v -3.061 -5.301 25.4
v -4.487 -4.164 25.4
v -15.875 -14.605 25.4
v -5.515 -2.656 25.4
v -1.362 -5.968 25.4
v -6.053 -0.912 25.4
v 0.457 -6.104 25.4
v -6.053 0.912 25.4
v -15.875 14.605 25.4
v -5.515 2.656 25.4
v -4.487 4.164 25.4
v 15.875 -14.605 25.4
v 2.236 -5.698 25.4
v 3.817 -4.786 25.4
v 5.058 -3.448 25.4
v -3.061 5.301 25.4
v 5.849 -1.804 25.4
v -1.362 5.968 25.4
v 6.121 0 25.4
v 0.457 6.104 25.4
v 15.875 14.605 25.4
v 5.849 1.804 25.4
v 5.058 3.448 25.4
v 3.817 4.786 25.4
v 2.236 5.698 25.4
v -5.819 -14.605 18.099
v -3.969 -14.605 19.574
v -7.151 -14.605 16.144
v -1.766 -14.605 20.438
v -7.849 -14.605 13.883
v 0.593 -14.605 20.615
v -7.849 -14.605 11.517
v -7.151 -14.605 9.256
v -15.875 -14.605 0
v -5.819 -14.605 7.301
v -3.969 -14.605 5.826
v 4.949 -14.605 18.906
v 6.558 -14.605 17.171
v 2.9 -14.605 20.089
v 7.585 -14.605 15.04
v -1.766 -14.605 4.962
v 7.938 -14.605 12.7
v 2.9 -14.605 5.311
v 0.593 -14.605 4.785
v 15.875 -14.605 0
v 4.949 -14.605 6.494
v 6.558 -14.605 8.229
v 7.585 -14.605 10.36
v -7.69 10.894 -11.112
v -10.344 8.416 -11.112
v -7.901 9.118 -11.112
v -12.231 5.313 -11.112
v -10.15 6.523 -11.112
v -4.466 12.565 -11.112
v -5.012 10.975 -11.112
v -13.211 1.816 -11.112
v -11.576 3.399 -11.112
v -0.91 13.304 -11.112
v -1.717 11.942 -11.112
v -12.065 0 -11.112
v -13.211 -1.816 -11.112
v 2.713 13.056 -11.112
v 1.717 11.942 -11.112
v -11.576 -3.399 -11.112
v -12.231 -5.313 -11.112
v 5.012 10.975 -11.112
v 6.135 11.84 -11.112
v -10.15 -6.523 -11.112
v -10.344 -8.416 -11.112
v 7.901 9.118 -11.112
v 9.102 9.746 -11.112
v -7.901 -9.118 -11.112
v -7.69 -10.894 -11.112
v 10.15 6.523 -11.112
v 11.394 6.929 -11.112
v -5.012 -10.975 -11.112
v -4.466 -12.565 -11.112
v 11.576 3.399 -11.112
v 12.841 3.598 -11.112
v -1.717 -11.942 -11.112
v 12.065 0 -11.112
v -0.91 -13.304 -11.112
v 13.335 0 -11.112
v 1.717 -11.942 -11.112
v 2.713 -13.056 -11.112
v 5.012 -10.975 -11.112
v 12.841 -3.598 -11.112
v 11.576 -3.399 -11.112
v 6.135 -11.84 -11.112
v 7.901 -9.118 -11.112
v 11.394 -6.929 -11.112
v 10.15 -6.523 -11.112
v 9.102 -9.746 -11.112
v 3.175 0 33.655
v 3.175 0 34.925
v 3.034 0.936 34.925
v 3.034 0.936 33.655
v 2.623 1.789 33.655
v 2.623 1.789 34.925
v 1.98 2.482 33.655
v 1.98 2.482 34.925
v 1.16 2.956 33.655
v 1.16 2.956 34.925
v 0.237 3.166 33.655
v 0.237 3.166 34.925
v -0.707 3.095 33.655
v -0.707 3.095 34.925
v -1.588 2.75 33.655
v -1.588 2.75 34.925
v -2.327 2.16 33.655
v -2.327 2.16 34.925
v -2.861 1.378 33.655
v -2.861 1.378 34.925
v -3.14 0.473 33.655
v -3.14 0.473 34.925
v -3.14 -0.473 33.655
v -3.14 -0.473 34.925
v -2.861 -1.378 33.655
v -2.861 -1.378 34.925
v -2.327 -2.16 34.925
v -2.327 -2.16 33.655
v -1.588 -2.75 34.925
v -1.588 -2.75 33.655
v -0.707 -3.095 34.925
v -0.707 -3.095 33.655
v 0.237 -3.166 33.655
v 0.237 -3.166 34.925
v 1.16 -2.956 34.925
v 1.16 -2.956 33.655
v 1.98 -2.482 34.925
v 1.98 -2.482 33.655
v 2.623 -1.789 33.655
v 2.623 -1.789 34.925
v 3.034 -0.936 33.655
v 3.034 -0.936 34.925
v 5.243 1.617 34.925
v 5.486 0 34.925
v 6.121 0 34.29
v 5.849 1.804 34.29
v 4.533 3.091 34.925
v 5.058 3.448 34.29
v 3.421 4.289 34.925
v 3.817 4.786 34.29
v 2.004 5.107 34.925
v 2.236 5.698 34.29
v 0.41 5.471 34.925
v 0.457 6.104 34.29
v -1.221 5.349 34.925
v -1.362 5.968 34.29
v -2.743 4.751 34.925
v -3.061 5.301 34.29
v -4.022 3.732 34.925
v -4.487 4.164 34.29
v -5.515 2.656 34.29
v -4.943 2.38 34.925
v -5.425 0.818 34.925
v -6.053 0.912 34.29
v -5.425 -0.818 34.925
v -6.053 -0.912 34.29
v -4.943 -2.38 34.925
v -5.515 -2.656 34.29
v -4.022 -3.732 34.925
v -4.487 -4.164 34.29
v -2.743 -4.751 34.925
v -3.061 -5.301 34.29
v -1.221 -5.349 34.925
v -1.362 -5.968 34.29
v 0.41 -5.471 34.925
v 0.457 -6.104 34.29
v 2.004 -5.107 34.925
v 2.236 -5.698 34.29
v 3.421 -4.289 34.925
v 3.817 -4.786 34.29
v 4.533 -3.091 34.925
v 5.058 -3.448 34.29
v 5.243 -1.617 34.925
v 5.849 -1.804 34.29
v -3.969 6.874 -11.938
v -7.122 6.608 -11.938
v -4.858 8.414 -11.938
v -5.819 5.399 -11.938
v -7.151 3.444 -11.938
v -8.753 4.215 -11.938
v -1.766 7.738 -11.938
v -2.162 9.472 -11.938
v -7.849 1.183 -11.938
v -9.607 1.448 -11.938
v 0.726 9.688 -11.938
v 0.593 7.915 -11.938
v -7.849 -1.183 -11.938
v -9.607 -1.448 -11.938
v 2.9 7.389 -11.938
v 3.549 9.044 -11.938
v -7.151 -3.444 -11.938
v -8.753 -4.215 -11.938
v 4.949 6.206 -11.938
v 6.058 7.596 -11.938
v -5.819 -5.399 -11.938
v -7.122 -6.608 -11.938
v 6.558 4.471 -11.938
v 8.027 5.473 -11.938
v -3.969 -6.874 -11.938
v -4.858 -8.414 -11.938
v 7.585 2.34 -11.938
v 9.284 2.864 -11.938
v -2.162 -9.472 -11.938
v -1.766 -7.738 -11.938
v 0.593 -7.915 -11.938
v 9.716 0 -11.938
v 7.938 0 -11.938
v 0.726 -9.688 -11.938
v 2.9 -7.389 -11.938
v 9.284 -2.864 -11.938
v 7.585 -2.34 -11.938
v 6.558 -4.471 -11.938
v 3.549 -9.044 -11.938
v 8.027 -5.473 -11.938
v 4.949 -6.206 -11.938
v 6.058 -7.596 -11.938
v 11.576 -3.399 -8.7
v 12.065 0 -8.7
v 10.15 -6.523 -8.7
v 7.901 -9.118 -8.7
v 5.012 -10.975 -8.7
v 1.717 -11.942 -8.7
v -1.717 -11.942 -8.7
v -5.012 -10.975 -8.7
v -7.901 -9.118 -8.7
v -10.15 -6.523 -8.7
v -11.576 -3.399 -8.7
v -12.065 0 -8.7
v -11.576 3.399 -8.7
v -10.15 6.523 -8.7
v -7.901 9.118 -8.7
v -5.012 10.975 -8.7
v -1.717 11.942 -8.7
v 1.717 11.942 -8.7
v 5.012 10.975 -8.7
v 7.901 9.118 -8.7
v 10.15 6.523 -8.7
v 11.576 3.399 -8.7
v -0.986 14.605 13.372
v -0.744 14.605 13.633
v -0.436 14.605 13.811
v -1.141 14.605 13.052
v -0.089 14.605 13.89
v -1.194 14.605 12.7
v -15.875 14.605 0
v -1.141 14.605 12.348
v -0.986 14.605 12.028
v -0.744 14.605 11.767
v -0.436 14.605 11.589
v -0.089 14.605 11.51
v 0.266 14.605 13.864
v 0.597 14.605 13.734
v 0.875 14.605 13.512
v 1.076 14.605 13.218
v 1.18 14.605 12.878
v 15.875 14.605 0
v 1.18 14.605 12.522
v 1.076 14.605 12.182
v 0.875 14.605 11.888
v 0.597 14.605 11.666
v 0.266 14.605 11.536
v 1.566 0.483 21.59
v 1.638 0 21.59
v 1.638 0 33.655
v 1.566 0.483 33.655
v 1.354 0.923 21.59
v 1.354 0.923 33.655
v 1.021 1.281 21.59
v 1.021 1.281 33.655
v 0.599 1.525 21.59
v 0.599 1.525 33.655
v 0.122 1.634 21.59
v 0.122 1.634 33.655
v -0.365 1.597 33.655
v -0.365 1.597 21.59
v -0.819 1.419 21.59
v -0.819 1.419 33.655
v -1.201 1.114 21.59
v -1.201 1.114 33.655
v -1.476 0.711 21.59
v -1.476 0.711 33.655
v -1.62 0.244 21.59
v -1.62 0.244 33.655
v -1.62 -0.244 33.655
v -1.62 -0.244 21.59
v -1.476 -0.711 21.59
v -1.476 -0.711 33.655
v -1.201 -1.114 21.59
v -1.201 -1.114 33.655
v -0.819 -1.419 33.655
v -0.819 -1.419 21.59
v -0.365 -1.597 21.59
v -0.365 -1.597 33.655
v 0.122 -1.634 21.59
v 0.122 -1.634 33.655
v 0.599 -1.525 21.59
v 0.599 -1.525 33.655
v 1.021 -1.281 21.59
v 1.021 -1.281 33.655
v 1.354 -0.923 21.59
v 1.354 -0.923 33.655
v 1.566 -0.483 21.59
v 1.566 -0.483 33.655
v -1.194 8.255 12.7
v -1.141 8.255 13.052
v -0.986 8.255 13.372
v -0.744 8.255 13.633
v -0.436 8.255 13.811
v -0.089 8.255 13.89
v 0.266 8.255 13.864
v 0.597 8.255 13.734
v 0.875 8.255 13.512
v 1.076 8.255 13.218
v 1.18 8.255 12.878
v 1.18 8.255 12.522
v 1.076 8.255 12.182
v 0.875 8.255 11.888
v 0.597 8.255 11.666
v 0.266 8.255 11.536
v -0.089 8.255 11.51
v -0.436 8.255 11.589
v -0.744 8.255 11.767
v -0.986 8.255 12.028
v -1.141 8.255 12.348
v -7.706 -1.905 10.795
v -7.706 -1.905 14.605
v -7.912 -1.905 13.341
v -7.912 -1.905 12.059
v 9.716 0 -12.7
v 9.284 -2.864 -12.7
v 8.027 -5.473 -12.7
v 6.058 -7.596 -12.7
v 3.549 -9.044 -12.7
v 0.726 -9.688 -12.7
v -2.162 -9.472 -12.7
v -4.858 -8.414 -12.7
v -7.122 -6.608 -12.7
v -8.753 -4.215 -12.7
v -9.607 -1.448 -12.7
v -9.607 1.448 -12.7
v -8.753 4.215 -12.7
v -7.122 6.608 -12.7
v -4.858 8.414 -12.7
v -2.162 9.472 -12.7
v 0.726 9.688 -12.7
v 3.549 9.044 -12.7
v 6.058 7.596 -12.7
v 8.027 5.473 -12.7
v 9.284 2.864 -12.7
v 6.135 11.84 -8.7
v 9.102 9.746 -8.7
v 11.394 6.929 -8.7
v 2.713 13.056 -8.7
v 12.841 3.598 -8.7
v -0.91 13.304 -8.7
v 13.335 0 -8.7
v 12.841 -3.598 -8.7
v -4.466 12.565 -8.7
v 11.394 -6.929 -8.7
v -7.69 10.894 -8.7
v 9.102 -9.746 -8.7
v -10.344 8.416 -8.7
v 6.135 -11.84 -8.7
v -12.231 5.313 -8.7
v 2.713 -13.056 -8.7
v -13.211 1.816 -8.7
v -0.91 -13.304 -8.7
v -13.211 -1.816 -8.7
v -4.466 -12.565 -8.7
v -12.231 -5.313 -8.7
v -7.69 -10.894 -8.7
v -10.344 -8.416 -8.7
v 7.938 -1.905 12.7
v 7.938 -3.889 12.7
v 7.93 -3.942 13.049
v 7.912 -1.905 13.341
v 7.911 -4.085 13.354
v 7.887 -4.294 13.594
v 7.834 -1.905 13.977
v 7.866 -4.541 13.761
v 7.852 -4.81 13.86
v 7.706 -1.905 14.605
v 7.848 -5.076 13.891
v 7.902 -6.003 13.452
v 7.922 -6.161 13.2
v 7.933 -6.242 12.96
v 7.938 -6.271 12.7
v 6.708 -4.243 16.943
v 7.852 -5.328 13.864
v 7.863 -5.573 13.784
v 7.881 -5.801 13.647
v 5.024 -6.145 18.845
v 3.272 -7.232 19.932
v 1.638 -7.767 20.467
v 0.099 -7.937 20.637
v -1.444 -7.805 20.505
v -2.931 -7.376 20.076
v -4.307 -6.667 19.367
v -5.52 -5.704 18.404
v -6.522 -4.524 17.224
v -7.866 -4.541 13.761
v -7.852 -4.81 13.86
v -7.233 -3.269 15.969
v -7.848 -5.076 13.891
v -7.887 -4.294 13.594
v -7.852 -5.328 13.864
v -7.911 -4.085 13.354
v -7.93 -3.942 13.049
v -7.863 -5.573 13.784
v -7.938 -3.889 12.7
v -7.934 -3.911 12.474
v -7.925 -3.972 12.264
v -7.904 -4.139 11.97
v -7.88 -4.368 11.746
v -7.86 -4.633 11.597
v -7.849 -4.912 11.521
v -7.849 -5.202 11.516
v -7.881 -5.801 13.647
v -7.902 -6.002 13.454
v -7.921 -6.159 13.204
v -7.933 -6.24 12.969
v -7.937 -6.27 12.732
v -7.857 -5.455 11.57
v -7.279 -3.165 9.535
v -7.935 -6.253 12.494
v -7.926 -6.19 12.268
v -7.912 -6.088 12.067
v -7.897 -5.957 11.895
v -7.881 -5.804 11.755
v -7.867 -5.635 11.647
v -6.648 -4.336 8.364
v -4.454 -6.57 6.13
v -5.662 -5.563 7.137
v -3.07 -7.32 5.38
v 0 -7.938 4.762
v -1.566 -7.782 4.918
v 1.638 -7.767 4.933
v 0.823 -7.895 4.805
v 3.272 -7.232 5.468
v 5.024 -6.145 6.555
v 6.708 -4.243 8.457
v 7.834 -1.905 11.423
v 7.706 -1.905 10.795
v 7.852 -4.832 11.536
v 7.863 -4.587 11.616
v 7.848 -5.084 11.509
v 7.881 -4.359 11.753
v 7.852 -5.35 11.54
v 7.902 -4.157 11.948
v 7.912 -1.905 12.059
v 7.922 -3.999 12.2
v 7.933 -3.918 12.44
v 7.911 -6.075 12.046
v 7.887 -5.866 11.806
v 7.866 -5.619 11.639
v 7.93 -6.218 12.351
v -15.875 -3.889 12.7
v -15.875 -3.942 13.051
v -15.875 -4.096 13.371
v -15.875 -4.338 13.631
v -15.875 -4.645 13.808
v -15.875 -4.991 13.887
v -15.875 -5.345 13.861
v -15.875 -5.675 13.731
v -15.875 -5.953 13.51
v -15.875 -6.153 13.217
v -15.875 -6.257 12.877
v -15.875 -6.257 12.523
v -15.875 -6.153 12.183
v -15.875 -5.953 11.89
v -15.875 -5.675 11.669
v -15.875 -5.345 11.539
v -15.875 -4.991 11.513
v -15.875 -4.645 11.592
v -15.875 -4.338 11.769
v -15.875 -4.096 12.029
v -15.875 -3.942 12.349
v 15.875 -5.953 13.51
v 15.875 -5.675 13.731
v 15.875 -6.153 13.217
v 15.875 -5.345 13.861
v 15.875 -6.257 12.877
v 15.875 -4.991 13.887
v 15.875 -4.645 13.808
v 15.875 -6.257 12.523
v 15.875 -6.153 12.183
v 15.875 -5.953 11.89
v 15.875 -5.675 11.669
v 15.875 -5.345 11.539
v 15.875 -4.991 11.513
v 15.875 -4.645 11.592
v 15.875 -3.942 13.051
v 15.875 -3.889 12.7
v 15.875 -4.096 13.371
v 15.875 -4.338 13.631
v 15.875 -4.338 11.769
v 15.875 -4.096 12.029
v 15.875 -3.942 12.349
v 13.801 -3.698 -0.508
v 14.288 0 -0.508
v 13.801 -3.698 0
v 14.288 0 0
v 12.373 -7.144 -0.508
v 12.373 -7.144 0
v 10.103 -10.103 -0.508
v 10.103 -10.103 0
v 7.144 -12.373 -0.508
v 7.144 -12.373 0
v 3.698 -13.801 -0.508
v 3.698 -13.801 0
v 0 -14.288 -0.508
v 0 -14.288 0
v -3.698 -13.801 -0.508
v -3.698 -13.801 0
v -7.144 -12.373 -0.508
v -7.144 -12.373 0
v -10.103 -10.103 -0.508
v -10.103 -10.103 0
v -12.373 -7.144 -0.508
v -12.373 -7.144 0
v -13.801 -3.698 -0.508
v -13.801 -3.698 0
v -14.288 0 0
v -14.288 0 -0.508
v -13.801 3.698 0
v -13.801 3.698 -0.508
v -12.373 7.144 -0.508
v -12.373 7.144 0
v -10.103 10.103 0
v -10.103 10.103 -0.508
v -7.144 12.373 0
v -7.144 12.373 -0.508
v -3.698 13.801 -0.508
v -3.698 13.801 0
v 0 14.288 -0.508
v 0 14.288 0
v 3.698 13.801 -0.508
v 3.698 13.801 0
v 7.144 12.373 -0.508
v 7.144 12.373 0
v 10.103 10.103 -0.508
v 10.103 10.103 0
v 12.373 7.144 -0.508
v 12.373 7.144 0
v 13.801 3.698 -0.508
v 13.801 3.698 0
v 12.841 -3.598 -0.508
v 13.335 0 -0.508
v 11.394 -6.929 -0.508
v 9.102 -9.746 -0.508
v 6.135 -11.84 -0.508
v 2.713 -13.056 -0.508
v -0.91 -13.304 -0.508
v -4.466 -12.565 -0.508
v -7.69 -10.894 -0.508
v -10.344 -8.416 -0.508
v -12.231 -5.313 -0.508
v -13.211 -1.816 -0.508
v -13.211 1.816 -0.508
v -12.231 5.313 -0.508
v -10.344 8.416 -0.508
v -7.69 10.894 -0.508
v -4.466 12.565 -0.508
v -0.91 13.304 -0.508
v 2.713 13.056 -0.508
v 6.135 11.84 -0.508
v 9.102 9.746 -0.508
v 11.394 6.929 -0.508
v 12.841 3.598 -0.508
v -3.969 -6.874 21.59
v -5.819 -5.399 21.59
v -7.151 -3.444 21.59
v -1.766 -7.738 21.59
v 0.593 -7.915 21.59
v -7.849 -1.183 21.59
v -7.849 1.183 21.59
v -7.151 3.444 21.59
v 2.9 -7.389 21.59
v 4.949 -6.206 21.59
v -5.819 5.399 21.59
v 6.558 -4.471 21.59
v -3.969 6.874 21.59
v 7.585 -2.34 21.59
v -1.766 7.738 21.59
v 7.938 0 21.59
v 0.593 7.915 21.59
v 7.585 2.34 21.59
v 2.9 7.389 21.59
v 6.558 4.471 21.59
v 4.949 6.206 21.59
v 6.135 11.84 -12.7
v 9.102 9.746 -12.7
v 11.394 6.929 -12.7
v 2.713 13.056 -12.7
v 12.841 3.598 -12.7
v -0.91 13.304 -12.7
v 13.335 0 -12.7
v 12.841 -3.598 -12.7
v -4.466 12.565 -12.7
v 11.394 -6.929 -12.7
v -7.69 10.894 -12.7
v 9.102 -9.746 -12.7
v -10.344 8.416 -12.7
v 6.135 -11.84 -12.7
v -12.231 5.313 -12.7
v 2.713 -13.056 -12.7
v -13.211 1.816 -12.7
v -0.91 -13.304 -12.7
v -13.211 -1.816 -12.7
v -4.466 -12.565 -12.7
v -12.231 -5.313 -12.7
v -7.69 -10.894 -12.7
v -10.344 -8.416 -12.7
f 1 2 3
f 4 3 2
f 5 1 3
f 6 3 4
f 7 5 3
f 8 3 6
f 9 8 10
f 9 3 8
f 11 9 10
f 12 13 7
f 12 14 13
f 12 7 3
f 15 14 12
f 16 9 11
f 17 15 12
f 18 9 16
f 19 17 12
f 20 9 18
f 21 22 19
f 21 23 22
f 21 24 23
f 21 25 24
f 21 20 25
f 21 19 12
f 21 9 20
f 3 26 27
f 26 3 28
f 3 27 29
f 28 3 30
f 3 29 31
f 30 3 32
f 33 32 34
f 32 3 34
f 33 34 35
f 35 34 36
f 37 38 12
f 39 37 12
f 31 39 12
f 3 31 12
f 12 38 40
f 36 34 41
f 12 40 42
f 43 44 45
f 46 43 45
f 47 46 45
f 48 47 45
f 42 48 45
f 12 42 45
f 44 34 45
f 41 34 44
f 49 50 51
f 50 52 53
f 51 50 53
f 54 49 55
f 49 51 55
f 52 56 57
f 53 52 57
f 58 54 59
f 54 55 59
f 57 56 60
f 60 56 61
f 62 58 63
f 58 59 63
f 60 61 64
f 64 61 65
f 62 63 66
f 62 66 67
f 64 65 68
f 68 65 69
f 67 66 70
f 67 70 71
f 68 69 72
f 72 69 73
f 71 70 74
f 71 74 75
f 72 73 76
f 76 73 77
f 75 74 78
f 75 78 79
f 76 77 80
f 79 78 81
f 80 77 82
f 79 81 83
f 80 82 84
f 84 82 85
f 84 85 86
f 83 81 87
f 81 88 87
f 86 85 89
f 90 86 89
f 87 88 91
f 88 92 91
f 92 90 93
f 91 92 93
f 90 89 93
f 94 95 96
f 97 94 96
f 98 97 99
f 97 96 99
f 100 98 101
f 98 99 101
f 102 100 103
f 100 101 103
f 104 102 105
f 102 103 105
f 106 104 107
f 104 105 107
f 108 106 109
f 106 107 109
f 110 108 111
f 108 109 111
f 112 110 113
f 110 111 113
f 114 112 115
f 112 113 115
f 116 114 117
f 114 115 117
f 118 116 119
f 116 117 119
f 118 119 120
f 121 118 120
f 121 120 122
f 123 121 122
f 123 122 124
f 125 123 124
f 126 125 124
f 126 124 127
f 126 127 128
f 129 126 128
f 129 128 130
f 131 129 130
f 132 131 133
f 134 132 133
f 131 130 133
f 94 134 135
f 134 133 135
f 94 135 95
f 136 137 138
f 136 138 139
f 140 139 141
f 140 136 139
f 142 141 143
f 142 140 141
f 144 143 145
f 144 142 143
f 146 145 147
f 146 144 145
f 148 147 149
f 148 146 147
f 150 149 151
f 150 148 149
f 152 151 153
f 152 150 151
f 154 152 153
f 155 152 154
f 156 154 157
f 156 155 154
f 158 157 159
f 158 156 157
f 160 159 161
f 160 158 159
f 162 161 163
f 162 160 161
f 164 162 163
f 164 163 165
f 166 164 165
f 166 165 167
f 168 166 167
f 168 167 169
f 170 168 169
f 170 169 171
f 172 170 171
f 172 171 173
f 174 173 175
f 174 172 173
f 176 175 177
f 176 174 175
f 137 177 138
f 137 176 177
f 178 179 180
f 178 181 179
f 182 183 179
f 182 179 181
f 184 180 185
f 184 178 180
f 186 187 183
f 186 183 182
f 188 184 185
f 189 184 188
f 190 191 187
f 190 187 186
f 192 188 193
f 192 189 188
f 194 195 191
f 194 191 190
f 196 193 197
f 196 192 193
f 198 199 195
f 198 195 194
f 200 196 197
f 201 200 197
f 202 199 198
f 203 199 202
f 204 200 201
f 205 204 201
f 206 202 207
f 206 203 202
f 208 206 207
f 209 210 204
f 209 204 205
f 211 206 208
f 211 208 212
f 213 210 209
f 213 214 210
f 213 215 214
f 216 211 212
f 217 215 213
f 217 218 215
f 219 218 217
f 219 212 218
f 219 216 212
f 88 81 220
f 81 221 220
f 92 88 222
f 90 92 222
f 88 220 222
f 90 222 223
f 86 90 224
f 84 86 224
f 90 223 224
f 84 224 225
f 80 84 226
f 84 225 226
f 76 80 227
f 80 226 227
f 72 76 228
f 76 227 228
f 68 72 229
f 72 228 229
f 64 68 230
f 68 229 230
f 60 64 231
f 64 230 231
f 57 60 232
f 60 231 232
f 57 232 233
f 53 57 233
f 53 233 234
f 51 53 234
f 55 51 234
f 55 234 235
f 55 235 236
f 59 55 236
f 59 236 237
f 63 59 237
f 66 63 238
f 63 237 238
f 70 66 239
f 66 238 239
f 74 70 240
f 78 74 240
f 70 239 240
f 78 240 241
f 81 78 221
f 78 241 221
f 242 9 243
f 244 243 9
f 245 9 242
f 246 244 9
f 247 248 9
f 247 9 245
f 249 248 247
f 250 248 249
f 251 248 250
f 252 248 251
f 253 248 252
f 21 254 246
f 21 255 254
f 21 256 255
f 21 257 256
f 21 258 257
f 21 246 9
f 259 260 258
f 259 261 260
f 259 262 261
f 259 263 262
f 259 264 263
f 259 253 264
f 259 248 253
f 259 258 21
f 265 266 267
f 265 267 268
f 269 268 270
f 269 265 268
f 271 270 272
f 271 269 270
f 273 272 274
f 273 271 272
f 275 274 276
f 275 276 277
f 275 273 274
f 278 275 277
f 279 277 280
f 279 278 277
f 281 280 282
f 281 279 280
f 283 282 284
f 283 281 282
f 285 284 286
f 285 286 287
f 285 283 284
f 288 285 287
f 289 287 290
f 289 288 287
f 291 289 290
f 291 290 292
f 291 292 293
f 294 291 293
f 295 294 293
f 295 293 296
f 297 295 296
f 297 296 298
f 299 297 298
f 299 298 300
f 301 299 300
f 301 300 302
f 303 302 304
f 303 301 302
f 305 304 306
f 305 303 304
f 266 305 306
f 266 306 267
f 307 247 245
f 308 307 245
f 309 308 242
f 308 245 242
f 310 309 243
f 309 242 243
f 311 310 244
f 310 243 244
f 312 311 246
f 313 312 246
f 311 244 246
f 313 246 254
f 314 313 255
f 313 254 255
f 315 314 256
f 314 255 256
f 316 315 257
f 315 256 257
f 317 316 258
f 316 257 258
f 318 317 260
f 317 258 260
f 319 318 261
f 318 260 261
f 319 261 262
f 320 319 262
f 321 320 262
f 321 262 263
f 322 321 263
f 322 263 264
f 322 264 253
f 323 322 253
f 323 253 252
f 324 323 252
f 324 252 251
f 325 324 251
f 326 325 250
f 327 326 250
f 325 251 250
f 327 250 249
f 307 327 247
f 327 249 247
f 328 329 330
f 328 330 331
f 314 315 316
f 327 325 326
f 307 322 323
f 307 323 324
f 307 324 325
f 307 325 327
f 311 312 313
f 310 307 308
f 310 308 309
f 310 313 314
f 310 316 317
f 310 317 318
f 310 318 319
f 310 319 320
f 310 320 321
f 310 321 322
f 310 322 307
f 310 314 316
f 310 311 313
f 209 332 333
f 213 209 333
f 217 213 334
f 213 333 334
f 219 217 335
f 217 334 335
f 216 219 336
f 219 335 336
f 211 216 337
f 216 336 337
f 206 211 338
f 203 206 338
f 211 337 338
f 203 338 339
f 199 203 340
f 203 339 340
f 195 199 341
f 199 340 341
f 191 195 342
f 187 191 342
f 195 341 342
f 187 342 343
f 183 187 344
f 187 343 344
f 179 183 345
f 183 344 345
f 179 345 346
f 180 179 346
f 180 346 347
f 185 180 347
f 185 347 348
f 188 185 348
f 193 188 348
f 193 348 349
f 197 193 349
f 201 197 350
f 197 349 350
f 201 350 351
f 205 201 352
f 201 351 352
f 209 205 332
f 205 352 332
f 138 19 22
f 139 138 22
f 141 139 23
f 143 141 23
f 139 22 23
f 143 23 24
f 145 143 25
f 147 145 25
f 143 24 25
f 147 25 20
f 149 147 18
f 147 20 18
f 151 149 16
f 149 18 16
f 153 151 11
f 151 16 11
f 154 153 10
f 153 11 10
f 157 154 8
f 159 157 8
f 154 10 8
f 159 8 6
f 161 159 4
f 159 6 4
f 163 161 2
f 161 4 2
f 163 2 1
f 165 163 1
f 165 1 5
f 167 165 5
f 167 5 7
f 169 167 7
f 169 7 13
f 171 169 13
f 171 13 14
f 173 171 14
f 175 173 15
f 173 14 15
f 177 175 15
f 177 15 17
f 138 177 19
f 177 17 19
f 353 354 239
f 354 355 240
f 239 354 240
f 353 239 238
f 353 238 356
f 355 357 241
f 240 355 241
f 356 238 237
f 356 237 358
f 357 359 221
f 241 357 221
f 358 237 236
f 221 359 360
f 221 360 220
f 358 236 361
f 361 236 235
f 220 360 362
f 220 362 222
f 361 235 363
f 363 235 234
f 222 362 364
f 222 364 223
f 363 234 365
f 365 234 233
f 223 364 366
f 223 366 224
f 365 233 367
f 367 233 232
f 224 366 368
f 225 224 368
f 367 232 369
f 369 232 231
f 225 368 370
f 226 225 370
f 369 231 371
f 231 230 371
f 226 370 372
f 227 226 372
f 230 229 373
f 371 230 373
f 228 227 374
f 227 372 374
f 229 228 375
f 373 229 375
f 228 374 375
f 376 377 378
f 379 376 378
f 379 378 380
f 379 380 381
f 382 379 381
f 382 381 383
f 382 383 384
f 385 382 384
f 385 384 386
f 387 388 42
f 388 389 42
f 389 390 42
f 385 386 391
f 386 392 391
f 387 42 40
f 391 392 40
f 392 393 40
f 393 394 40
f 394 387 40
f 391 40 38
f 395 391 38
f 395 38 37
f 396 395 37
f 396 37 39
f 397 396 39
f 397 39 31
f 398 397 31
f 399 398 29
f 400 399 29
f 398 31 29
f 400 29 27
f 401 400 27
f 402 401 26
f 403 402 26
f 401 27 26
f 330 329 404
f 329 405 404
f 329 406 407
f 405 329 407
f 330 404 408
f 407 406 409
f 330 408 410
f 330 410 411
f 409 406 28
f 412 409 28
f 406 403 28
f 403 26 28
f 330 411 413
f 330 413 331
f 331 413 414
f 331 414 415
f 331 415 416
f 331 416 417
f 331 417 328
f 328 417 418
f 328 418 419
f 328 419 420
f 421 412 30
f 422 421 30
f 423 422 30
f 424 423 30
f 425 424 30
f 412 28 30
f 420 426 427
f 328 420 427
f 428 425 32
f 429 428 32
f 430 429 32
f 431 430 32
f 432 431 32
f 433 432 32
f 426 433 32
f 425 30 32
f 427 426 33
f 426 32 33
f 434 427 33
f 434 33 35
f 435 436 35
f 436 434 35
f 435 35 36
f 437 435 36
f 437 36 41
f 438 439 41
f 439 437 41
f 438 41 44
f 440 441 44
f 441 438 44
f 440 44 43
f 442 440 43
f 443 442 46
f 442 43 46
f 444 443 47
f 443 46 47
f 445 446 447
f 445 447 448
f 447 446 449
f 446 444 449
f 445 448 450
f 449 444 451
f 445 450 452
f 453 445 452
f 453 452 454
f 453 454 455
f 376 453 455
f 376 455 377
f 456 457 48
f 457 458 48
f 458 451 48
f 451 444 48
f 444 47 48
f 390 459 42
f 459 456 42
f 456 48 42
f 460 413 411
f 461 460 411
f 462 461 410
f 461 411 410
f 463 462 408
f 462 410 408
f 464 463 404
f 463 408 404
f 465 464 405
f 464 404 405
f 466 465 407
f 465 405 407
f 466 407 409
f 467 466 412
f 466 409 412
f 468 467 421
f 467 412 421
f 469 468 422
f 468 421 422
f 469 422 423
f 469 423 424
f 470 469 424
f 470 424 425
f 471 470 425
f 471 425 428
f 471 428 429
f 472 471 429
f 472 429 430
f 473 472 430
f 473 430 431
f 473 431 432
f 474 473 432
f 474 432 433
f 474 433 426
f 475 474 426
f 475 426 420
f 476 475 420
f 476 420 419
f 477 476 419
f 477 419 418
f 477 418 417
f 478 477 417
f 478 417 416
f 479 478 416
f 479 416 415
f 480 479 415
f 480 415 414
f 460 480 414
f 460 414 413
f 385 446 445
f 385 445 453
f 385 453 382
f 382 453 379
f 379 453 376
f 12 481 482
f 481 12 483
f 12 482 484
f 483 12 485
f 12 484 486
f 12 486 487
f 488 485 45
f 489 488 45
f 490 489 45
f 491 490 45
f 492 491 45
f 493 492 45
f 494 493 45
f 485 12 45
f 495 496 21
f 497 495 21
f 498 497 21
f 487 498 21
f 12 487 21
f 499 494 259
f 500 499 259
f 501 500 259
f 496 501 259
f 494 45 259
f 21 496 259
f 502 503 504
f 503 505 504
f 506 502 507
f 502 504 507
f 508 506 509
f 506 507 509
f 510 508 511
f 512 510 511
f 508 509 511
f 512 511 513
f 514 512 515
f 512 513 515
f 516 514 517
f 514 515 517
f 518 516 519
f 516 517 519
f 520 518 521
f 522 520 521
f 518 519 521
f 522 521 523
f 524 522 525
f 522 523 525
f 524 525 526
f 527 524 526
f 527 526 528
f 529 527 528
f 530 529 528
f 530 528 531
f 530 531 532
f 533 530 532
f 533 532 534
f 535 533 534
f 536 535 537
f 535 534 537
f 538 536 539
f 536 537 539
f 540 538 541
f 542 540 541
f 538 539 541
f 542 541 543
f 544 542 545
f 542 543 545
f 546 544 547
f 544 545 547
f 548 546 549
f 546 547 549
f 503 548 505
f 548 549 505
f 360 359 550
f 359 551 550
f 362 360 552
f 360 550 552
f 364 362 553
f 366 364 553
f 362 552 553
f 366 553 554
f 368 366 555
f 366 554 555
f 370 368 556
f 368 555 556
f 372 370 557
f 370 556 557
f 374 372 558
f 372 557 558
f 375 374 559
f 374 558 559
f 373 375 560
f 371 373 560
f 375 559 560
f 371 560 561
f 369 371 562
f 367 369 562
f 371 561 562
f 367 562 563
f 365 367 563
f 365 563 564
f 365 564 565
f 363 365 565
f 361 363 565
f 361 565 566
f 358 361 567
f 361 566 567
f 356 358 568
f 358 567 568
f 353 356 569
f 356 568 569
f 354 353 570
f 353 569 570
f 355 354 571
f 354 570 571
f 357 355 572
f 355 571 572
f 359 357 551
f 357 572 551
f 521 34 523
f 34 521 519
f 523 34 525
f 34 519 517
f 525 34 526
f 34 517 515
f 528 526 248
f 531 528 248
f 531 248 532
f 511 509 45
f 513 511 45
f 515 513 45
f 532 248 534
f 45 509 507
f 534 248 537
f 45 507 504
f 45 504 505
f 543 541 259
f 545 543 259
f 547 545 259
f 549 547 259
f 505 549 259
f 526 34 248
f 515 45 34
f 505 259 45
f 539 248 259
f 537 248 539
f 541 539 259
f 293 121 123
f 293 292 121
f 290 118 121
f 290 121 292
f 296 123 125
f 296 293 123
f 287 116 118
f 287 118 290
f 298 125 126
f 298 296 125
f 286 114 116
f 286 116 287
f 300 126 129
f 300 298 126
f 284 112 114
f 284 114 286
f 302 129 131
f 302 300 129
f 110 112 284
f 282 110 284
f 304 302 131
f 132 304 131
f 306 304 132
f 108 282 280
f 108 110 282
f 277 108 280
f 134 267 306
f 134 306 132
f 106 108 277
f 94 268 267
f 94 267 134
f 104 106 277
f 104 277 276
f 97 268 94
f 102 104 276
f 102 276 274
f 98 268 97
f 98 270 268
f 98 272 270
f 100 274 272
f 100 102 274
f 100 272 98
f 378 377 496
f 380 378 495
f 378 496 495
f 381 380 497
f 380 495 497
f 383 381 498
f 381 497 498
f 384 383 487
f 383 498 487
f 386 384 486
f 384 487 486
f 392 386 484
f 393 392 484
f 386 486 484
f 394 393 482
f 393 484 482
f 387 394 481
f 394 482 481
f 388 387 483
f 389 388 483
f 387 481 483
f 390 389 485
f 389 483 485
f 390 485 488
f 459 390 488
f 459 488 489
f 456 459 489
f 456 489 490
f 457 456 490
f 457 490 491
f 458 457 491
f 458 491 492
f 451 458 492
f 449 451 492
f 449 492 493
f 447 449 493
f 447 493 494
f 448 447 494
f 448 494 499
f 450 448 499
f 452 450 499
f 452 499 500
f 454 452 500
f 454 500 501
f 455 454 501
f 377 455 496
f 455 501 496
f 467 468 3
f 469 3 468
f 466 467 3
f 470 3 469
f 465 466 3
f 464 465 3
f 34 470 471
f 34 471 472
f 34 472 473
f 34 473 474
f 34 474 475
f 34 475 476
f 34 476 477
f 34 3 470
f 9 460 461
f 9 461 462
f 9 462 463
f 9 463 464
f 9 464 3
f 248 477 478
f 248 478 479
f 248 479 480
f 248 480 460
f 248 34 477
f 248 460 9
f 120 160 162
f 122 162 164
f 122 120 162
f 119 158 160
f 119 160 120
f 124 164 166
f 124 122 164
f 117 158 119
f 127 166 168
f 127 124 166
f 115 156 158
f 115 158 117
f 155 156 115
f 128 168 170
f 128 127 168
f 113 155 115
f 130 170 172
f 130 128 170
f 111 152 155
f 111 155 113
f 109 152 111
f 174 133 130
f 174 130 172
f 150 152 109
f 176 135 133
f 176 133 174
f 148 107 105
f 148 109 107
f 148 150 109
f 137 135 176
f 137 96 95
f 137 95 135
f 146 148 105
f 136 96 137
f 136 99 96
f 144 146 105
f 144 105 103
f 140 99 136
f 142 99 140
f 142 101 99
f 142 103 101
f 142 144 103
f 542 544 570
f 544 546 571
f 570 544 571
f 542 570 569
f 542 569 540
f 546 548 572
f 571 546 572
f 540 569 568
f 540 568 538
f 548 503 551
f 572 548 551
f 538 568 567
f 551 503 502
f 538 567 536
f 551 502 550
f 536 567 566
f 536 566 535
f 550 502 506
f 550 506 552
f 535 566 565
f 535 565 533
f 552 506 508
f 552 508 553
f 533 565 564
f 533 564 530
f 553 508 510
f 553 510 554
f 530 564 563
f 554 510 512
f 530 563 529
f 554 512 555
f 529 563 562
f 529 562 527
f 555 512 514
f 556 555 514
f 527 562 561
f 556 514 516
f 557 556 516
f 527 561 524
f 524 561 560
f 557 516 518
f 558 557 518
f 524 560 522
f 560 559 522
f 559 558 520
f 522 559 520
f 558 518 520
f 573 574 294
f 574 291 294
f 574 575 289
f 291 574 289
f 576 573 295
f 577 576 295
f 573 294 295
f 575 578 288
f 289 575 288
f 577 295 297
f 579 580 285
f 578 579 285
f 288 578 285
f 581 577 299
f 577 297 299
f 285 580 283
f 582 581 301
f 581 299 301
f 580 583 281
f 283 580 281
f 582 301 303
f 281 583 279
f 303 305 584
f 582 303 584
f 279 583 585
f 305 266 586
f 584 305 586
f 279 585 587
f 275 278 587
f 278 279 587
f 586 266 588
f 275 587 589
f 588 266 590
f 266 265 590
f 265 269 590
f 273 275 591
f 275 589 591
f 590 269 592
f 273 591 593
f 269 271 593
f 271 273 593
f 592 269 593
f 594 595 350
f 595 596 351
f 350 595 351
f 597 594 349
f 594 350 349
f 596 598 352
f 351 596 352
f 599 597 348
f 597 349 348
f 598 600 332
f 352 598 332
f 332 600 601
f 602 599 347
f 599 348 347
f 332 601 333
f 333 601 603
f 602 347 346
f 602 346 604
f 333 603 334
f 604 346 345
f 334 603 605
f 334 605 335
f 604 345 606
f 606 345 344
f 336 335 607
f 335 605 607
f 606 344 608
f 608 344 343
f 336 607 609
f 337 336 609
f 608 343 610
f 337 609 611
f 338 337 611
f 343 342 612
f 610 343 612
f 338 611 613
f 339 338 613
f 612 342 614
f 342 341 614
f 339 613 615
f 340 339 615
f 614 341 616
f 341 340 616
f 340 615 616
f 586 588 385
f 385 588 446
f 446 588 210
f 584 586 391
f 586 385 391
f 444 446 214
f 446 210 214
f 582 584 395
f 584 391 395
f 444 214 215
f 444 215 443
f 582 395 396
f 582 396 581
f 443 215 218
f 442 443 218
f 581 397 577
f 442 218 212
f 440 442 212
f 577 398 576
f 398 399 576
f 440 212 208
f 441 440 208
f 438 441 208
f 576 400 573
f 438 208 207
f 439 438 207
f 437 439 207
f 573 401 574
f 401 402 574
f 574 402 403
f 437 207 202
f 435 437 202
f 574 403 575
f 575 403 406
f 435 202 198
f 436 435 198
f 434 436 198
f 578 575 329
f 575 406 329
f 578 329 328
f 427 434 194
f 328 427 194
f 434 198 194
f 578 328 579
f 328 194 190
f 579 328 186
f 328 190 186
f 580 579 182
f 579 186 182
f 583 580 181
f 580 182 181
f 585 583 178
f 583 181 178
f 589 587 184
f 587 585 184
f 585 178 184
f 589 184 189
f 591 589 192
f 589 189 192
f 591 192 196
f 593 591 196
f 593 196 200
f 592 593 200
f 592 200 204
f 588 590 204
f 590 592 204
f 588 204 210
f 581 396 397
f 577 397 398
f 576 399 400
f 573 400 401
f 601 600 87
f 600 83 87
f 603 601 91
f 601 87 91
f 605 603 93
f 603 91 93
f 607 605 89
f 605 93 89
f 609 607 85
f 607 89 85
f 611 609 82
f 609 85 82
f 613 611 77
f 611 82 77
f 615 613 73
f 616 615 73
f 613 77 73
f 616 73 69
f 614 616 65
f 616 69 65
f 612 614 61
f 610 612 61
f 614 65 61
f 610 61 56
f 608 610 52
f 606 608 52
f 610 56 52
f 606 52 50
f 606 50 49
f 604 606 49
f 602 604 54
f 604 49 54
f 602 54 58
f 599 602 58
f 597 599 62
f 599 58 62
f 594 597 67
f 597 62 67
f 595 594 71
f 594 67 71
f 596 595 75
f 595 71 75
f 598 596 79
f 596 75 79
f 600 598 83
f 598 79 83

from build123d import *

# Parameters (mm, degrees)
F0_W      = 31.75
F0_H      = 29.21
F0_R      = 14.2875
F0_R_2    = 13.335
F0_R_3    = 7.9375
F0_R_4    = 1.6383
F1_DEPTH  = 25.4
F2_R      = 6.1214
F2_R_2    = 1.6383
F3_DEPTH  = 9.525
F4_R      = 3.175
F4_R_2    = 1.6383
F5_DEPTH  = 1.27
F7_DEPTH  = 21.59
F8_SIZE   = 0.635
F9_R      = 7.9375
F10_DEPTH = 12.7
F11_R     = 1.1938
F12_DEPTH = 6.35
F13_R     = 1.190625
F14_DEPTH = 31.751
F17_R     = 7.9375
F18_DEPTH = 12.7
F19_R     = 9.7155
F20_DEPTH = 0.762


# Not quite as in the source:
# - a feature names something its author has since deleted; it is built from what else it names


with BuildPart() as f1:
    # F0 (on Top) → F1 (new body)
    with BuildSketch(Plane.XY):
        Rectangle(F0_W, F0_H)
        Circle(F0_R, mode=Mode.SUBTRACT)
        Circle(F0_R)
        Circle(F0_R_2, mode=Mode.SUBTRACT)
        Circle(F0_R_2)
        Circle(F0_R_3, mode=Mode.SUBTRACT)
        Circle(F0_R_3)
        Circle(F0_R_4, mode=Mode.SUBTRACT)
    extrude(amount=F1_DEPTH)

    # F2 (on face) → F3 (join)
    with BuildSketch(Plane.XY.offset(25.4)):
        Circle(F2_R)
        Circle(F2_R_2, mode=Mode.SUBTRACT)
    extrude(amount=F3_DEPTH)

    # F4 (on face) → F5 (cut)
    with BuildSketch(Plane.XY.offset(34.925)):
        Circle(F4_R)
        Circle(F4_R_2, mode=Mode.SUBTRACT)
    extrude(amount=-F5_DEPTH, mode=Mode.SUBTRACT)

    # F0 (on Top) → F7 (cut)
    with BuildSketch(Plane.XY):
        Circle(F0_R_3)
        Circle(F0_R_4, mode=Mode.SUBTRACT)
    extrude(amount=F7_DEPTH, mode=Mode.SUBTRACT)

    # F8
    f8_edges = [f1.edges().sort_by_distance(p)[0] for p in [
        (-6.1214, 0, 34.925),
    ]]
    chamfer(f8_edges, length=F8_SIZE)

    # F9 (on face) → F10 (cut)
    with BuildSketch(Plane.XZ.offset(14.605)):
        with Locations((0, 12.7)):
            Circle(F9_R)
    extrude(amount=-F10_DEPTH, mode=Mode.SUBTRACT)

    # F11 (on face) → F12 (cut)
    with BuildSketch(Plane(origin=(0, 14.605, 0), x_dir=(-1, 0, 0), z_dir=(0, 1, 0))):
        with Locations((0, 12.7)):
            Circle(F11_R)
    extrude(amount=-F12_DEPTH, mode=Mode.SUBTRACT)

    # F13 (on face) → F14 (cut, through all)
    with BuildSketch(Plane.YZ.offset(15.875)):
        with Locations((-5.08, 12.7)):
            Circle(F13_R)
    extrude(amount=-F14_DEPTH, mode=Mode.SUBTRACT)

    # F15 (on Front) → F16 (revolve)
    with BuildSketch(Plane.XZ):
        Polygon((0, 0), (0, -12.7), (13.335, -12.7), (13.335, -11.1125), (12.065, -11.1125), (12.065, -8.6995), (13.335, -8.6995), (13.335, -0.508), (14.2875, -0.508), (14.2875, 0), align=None)
    revolve(axis=Axis((0, 0, -6.35), (0, 0, -1)))

    # F17 (on face) → F18 (cut)
    with BuildSketch(Plane(origin=(0, 0, -12.7), x_dir=(1, 0, 0), z_dir=(0, 0, -1))):
        Circle(F17_R)
    extrude(amount=-F18_DEPTH, mode=Mode.SUBTRACT)

    # F19 (on face) → F20 (cut)
    with BuildSketch(Plane(origin=(0, 0, -12.7), x_dir=(1, 0, 0), z_dir=(0, 0, -1))):
        Circle(F19_R)
    extrude(amount=-F20_DEPTH, mode=Mode.SUBTRACT)


solid = f1.part
